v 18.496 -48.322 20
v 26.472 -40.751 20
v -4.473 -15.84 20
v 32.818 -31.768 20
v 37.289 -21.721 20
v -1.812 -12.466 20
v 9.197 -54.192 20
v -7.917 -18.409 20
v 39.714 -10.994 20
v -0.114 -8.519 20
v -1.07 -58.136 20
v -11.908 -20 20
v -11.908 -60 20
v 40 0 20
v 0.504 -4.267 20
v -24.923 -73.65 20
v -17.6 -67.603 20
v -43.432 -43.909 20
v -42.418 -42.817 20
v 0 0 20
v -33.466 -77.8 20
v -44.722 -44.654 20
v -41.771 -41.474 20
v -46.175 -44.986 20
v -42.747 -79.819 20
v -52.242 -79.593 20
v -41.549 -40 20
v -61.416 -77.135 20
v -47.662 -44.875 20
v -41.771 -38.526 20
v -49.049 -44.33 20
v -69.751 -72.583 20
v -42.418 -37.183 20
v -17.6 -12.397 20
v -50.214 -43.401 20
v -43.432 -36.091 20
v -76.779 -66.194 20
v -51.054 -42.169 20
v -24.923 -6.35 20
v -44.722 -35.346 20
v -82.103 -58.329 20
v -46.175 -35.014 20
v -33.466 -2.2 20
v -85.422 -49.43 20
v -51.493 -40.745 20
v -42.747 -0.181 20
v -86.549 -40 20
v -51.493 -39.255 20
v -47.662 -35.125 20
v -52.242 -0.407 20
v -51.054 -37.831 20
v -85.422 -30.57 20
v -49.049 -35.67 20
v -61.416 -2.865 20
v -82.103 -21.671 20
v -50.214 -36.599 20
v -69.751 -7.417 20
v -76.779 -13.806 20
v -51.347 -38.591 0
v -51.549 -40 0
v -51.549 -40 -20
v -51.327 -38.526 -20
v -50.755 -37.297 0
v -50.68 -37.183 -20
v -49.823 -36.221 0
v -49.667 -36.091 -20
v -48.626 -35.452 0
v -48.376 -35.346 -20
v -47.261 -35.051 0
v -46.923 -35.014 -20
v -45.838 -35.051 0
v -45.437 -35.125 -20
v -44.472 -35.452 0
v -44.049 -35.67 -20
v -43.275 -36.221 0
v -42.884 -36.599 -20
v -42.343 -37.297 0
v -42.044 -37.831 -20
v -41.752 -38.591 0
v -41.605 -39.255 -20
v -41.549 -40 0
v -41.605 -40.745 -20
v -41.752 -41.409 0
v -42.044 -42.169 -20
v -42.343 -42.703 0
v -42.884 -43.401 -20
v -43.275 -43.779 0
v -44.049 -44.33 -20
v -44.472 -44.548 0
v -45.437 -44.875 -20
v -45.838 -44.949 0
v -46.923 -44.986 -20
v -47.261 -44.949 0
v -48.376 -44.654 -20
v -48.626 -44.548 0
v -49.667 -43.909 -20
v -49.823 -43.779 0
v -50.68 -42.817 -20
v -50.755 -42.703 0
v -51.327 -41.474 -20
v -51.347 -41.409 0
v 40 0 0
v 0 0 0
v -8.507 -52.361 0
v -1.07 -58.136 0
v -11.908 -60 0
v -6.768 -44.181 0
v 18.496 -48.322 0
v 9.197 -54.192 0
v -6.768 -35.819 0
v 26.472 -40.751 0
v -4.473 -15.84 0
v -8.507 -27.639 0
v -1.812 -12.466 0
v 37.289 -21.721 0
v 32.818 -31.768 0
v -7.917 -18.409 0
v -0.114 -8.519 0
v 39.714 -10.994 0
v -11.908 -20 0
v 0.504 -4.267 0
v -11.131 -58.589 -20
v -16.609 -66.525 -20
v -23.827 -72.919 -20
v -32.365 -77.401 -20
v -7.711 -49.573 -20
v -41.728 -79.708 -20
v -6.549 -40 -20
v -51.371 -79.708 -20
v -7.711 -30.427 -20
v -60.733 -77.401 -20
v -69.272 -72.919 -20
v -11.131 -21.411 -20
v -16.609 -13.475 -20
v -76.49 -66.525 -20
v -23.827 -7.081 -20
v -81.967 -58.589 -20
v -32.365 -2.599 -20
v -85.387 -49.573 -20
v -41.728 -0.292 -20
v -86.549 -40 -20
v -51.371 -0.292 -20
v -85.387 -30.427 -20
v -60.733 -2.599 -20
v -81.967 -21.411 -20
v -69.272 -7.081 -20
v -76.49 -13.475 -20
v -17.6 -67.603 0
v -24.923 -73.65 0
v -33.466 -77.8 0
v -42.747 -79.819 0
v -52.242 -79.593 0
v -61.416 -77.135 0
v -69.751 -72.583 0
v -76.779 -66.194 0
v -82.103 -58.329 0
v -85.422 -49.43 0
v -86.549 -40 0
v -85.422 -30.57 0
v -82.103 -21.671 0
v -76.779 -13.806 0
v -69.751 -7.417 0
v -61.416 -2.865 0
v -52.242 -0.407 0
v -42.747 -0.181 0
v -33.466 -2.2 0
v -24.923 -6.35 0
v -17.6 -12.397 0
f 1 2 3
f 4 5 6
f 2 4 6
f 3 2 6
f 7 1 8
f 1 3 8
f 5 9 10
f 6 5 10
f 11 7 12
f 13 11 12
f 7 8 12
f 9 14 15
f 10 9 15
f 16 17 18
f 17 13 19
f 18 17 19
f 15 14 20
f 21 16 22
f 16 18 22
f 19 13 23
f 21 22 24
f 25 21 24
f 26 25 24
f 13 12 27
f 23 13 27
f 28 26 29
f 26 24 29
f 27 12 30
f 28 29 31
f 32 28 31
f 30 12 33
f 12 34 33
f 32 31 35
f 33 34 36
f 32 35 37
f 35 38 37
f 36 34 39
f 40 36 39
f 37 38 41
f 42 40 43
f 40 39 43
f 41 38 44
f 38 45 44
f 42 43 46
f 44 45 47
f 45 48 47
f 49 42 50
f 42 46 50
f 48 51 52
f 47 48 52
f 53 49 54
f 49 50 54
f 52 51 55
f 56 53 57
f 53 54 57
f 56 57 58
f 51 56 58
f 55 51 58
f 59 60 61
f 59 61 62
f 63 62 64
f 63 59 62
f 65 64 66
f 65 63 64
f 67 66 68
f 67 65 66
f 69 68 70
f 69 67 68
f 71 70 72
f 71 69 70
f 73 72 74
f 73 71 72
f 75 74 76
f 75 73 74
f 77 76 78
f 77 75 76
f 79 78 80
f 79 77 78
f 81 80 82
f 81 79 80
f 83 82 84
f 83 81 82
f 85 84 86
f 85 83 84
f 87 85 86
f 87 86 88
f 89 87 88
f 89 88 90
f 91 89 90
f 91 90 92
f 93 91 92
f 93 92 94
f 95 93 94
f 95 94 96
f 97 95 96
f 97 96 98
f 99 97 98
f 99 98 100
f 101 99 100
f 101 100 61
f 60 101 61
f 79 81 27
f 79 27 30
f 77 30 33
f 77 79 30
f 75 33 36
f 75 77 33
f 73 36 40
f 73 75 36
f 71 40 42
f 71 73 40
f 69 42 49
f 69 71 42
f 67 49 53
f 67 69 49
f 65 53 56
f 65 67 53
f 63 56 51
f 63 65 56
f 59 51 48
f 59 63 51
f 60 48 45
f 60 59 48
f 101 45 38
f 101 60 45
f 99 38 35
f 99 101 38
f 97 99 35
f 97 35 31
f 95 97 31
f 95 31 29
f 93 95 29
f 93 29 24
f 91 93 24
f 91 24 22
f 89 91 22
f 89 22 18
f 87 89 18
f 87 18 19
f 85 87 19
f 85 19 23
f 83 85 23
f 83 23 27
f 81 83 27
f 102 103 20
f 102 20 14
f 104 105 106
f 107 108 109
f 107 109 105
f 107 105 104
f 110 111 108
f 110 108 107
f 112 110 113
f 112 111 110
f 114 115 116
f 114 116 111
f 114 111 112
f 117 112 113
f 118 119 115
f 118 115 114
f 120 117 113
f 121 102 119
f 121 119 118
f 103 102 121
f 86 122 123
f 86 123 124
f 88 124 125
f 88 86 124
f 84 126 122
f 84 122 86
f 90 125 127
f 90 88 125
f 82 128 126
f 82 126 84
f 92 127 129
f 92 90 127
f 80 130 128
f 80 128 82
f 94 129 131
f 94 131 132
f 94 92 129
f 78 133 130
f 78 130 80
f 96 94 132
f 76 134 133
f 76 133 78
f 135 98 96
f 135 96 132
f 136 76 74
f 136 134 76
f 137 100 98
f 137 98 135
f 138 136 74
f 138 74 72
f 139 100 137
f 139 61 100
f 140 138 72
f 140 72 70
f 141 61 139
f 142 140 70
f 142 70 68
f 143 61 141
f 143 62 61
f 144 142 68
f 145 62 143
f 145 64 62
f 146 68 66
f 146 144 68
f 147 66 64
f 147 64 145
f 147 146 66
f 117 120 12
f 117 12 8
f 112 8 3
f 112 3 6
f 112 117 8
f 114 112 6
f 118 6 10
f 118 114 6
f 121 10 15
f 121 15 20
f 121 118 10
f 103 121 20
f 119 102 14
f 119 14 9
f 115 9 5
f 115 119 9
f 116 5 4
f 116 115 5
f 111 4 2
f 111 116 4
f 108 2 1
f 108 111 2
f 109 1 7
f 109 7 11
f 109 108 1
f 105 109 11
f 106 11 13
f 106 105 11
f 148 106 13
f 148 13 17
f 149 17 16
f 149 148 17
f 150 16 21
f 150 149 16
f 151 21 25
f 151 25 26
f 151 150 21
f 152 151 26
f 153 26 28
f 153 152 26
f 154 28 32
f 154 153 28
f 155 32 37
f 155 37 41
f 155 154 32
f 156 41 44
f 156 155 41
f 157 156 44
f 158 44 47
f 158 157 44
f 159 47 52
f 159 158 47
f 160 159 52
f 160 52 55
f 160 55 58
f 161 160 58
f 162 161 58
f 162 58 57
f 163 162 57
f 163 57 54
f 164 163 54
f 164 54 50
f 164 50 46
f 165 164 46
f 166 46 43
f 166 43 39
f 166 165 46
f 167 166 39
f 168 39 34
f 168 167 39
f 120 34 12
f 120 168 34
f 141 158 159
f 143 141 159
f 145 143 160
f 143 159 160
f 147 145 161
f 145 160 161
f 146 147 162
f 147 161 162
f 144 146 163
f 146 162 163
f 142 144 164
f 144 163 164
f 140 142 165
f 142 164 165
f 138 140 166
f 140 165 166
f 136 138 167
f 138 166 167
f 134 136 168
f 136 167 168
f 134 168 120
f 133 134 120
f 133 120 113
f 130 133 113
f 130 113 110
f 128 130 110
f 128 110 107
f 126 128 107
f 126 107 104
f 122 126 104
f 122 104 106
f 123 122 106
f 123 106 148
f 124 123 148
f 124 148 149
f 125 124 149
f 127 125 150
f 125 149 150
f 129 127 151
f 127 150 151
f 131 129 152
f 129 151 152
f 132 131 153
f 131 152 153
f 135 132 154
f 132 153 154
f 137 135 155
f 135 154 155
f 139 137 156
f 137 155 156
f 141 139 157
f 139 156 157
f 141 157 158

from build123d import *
from build123d.topology import SkipClean

# Parameters (mm, degrees)
SKETCH1_R           = 5
BOSS_EXTRUDE1_DEPTH = 20
SKETCH2_R           = 40
SKETCH2_R_2         = 5
BOSS_EXTRUDE2_DEPTH = 20


with BuildPart() as part:
    # Sketch1 → Boss-Extrude1 (new body)
    with BuildSketch(Plane.XY):
        with BuildLine():
            Line((0, 0), (40, 0))
            ThreePointArc((40, 0), (26.472356234, -40.750519772), (-11.908101275, -60))
            ThreePointArc((-11.908101275, -60), (-86.549117426, -40), (-11.908101275, -20))
            ThreePointArc((-11.908101275, -20), (-1.811915014, -12.466248525), (0, 0))
        make_face()
        with Locations((-46.549117426, -40)):
            Circle(SKETCH1_R, mode=Mode.SUBTRACT)
    extrude(amount=BOSS_EXTRUDE1_DEPTH)

    # Sketch2 → Boss-Extrude2 (add)
    with SkipClean():  # the faces are left unmerged after this step: merging them gives an invalid solid
        with BuildSketch(Plane(origin=(0, 0, 0), x_dir=(-1, 0, 0), z_dir=(0, 0, -1))):
            with Locations((46.549117426, -40)):
                Circle(SKETCH2_R)
            with Locations((46.549117426, -40)):
                Circle(SKETCH2_R_2, mode=Mode.SUBTRACT)
        extrude(amount=BOSS_EXTRUDE2_DEPTH)


solid = part.part
